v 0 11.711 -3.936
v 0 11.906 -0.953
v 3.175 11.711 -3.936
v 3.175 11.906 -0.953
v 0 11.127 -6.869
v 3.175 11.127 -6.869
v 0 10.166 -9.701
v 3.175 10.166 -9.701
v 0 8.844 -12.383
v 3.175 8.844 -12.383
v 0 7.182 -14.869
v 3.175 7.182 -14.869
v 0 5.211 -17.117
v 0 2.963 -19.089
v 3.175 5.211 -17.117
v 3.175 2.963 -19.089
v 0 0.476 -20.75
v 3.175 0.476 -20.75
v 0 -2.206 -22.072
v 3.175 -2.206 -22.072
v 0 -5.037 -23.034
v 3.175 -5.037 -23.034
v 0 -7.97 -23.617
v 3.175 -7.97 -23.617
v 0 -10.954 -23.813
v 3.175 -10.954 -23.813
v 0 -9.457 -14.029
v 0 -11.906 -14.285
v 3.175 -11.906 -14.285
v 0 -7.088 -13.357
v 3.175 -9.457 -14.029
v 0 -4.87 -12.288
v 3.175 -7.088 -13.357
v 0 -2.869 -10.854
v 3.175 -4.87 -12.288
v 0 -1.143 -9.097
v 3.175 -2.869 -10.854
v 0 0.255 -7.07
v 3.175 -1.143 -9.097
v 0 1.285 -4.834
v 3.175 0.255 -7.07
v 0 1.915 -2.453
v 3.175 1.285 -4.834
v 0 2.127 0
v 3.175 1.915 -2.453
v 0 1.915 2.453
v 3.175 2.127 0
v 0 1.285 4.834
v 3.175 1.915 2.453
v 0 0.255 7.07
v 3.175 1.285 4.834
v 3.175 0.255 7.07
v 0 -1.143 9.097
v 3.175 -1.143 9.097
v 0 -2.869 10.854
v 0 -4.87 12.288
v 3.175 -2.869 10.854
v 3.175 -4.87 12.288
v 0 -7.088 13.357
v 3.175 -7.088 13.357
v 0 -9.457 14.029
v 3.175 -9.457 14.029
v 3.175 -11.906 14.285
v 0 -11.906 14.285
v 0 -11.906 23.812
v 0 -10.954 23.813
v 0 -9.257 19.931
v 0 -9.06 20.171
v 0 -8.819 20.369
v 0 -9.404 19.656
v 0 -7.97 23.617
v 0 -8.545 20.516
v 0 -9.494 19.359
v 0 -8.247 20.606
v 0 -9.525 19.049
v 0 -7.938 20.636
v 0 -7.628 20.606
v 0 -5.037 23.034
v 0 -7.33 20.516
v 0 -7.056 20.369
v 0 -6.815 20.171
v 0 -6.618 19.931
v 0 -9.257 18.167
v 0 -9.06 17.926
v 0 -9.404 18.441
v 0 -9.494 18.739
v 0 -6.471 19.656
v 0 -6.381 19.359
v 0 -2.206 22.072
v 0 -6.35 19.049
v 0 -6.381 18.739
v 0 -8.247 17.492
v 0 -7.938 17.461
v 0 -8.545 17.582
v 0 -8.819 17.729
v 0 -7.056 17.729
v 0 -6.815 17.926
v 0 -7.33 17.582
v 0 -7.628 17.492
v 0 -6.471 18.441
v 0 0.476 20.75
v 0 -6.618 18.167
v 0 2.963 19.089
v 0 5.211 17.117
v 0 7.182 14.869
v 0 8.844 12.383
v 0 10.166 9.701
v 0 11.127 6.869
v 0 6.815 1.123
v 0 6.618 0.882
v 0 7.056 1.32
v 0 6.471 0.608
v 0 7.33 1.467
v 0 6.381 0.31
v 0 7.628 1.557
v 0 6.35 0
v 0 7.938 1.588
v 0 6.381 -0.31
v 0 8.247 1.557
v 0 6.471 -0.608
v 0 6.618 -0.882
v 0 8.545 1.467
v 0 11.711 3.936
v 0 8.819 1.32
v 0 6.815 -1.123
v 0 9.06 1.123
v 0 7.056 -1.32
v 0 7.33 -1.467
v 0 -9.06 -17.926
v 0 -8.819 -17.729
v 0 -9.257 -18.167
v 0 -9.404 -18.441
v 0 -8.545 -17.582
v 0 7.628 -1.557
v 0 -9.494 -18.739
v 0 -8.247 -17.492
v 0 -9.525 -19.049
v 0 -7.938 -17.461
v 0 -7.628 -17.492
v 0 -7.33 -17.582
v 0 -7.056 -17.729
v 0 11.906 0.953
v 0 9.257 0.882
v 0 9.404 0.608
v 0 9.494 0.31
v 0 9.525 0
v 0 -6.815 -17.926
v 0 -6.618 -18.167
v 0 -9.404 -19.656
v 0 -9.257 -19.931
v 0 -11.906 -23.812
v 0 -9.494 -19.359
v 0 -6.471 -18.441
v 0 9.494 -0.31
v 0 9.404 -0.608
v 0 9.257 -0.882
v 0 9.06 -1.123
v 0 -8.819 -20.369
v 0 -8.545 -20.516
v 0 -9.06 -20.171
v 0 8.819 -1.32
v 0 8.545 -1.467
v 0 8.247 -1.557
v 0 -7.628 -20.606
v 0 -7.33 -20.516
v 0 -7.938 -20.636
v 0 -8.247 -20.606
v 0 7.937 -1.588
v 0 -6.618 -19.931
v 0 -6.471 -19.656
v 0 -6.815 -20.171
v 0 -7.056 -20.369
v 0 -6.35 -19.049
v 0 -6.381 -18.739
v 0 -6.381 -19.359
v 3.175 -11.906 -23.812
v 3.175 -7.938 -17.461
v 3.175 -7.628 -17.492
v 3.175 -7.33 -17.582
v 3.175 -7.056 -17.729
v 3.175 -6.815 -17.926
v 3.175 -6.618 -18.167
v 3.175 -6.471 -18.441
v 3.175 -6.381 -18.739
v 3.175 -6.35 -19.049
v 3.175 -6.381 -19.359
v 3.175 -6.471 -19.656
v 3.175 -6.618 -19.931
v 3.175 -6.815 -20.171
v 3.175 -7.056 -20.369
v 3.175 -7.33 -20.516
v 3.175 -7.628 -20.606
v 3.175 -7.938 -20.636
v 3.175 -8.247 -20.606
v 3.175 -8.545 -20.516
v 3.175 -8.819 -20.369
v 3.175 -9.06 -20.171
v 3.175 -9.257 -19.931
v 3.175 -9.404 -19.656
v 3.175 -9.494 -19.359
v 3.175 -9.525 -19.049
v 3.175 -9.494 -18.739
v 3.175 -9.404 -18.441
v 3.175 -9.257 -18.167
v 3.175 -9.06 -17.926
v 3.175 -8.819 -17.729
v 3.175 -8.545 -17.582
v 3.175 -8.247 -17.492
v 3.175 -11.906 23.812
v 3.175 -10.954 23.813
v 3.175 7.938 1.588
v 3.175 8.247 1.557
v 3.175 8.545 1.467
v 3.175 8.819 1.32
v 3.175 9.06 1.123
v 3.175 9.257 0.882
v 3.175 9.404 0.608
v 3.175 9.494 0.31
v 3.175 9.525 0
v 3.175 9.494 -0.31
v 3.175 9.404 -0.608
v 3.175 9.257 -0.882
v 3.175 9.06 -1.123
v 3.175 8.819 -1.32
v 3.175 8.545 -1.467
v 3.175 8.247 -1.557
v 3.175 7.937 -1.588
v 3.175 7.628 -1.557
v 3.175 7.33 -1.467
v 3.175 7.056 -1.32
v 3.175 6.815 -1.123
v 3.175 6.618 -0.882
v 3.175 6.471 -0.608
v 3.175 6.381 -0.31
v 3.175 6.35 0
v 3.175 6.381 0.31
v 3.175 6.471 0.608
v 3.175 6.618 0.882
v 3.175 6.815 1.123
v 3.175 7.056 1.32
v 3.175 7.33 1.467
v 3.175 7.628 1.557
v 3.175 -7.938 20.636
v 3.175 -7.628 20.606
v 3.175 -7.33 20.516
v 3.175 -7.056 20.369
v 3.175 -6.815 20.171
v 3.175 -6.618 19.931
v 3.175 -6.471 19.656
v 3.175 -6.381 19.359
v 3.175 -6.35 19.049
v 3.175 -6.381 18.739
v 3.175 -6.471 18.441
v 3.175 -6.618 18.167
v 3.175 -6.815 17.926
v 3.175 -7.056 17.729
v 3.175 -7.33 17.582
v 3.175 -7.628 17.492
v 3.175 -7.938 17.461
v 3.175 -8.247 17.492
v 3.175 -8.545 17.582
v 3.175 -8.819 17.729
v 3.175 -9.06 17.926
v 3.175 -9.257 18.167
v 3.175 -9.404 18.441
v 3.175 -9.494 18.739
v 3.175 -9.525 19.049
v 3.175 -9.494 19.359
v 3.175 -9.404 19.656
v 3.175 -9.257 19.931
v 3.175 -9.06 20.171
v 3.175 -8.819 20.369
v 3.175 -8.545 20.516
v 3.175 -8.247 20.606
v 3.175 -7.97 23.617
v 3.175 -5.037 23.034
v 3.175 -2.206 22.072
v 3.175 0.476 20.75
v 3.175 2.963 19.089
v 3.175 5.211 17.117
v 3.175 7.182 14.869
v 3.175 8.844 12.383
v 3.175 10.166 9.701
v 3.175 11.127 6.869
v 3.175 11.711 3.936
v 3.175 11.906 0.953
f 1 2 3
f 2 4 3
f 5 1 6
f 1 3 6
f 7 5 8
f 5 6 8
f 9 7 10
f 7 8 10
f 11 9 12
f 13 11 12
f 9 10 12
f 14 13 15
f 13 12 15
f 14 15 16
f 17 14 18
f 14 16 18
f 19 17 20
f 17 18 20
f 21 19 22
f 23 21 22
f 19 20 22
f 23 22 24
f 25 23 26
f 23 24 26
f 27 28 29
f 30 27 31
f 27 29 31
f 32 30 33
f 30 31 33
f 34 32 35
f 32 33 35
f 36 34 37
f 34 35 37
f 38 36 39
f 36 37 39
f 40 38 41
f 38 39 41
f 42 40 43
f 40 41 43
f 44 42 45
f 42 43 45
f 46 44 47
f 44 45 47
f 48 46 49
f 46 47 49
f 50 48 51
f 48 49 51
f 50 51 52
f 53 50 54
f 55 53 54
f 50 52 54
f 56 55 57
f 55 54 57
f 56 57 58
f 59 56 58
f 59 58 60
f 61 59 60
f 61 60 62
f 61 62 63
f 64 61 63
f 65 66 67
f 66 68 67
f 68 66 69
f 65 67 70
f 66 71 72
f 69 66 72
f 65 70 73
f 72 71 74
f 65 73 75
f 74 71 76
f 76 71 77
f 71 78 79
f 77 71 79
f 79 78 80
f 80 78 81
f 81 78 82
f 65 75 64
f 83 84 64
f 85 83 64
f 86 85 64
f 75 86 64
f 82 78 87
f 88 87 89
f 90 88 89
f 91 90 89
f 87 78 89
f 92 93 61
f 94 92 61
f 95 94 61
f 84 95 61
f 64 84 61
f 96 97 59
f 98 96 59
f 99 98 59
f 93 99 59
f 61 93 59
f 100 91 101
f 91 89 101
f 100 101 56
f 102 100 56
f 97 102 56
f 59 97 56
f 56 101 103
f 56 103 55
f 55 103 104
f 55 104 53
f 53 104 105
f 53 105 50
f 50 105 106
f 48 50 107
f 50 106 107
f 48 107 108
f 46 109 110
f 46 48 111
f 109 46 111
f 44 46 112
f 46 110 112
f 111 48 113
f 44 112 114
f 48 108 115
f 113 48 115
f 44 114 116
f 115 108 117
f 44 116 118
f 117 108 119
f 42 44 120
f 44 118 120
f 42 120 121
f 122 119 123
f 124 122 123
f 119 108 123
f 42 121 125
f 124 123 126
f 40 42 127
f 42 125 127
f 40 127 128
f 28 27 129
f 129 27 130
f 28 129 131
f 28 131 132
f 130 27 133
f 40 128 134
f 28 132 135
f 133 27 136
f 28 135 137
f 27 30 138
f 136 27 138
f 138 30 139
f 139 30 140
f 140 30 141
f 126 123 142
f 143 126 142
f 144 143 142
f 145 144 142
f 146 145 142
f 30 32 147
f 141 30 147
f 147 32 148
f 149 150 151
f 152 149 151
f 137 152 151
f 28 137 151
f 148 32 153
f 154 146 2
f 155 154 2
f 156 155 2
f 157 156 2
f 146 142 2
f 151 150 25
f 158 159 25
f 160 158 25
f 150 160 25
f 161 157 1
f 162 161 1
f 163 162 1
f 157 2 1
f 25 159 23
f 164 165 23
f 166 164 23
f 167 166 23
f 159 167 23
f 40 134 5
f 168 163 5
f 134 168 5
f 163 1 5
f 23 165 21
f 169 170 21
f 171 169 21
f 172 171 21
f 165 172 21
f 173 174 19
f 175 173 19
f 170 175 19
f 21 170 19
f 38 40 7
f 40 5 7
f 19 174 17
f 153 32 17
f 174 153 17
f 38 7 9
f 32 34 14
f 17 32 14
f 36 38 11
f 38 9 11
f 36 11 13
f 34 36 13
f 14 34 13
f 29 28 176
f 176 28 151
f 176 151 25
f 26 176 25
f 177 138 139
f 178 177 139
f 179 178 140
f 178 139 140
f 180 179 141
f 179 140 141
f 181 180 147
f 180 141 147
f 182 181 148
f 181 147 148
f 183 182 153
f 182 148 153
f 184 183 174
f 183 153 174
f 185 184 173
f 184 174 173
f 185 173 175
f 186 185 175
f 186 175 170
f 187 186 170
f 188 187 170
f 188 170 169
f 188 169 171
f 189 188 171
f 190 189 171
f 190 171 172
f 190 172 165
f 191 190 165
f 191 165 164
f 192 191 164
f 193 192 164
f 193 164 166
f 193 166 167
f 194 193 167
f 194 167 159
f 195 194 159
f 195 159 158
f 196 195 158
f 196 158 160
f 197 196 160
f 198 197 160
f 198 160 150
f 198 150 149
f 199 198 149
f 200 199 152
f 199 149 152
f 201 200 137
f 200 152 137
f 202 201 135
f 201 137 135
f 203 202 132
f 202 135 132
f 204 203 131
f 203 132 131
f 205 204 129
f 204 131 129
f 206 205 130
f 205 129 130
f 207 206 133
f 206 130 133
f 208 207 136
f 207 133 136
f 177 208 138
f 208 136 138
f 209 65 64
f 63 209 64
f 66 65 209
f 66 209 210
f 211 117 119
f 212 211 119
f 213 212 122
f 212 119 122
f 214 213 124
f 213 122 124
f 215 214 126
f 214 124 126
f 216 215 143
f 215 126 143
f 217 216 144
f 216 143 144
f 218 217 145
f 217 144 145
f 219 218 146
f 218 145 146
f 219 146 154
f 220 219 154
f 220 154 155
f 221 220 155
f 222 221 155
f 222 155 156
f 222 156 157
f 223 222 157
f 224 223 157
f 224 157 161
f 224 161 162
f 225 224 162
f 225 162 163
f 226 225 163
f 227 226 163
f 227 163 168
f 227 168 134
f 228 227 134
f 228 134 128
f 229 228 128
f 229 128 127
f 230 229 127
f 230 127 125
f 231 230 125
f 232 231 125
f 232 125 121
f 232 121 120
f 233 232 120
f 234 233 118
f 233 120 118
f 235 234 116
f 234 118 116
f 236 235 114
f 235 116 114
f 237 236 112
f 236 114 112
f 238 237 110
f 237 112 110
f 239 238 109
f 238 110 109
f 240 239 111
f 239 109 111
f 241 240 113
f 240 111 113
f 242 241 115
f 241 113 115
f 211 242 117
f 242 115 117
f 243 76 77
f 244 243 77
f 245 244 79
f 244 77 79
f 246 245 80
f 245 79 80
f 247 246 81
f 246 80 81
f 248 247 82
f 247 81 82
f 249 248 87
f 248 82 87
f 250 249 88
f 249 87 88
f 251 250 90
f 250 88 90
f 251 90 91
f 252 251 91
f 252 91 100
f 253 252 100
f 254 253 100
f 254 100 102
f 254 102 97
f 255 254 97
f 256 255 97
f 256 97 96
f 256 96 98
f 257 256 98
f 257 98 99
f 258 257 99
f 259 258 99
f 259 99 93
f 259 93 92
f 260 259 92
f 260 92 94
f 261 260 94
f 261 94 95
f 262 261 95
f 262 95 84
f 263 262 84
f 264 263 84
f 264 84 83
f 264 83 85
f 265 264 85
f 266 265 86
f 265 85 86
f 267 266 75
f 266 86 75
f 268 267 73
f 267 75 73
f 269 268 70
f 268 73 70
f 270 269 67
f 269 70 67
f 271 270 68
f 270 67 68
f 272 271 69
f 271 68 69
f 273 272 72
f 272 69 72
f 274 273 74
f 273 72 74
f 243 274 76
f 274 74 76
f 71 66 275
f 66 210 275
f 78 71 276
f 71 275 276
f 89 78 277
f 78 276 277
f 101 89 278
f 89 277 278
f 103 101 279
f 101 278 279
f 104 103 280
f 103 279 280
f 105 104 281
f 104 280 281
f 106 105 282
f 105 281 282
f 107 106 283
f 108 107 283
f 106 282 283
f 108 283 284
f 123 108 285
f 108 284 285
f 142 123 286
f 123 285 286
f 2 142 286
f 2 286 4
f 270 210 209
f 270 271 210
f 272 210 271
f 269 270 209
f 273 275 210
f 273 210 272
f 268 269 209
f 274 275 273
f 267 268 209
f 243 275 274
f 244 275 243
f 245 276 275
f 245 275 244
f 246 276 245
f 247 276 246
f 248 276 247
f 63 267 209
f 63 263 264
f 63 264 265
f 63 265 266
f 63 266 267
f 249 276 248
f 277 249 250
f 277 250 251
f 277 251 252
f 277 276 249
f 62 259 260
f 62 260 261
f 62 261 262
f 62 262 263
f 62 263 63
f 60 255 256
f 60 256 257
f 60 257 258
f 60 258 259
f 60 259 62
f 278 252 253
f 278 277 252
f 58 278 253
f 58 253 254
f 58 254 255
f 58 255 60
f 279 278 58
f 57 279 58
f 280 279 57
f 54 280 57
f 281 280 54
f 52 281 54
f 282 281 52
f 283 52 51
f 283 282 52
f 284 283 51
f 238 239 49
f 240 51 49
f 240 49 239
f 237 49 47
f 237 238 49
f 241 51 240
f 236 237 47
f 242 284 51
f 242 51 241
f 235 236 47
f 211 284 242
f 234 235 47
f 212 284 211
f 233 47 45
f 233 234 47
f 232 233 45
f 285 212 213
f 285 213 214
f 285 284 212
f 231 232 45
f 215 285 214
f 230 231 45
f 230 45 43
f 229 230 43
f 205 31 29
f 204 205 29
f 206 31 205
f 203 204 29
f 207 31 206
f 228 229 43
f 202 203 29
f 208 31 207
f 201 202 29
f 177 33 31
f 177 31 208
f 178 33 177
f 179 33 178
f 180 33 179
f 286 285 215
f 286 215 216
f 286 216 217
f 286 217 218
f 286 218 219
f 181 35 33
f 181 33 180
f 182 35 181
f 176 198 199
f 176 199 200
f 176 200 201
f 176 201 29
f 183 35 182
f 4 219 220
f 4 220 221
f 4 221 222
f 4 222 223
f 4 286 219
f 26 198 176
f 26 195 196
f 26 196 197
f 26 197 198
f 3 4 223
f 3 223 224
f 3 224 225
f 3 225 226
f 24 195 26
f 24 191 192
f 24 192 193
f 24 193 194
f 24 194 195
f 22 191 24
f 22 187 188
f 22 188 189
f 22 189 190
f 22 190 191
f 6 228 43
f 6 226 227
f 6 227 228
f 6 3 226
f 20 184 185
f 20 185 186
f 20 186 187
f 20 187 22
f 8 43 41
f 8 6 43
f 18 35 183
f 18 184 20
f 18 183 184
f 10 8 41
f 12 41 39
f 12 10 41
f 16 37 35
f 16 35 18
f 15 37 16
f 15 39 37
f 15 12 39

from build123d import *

# Parameters (mm, degrees)
SKETCH1_W                        = 47.625
SKETCH1_H                        = 23.8125
BOSS_EXTRUDE1_DEPTH              = 3.175
SKETCH2_R                        = 14.2875
CUT_EXTRUDE1_DEPTH               = 27.811836385
F_1_8_0_125_DIAMETER_HOLE1_D     = 3.175
F_1_8_0_125_DIAMETER_HOLE1_DEPTH = 19.001994
F_1_8_0_125_DIAMETER_HOLE1_TIP   = 0.953866233
FILLET1_R                        = 22.86


with BuildPart() as part:
    # Sketch1 → Boss-Extrude1 (new body)
    with BuildSketch(Plane(origin=(0, 0, 0), x_dir=(0, 0, -1), z_dir=(1, 0, 0))):
        Rectangle(SKETCH1_W, SKETCH1_H)
    extrude(amount=BOSS_EXTRUDE1_DEPTH)

    # Sketch2 → Cut-Extrude1 (cut, through all)
    with BuildSketch(Plane(origin=(3.175, 0, 0), x_dir=(0, 0, -1), z_dir=(1, 0, 0))):
        with Locations((0, -12.16025)):
            Circle(SKETCH2_R)
    extrude(amount=-CUT_EXTRUDE1_DEPTH, mode=Mode.SUBTRACT)

    # 1/8 (0.125) Diameter Hole1
    with Locations(Plane(origin=(3.175, 0, 0), x_dir=(0, 0, -1), z_dir=(1, 0, 0))):
        with Locations((-19.048871022, -7.9375), (0, 7.9375), (19.048871022, -7.9375)):
            Hole(F_1_8_0_125_DIAMETER_HOLE1_D / 2, depth=F_1_8_0_125_DIAMETER_HOLE1_DEPTH)
            with Locations((0, 0, -(F_1_8_0_125_DIAMETER_HOLE1_DEPTH + F_1_8_0_125_DIAMETER_HOLE1_TIP / 2))):  # 118° drill point
                Cone(0, F_1_8_0_125_DIAMETER_HOLE1_D / 2, F_1_8_0_125_DIAMETER_HOLE1_TIP, mode=Mode.SUBTRACT)

    # Fillet1
    fillet1_edges = [part.edges().sort_by_distance(p)[0] for p in [
        (1.5875, 11.90625, 23.8125),
        (1.5875, 11.90625, -23.8125),
    ]]
    fillet(fillet1_edges, radius=FILLET1_R)


solid = part.part
